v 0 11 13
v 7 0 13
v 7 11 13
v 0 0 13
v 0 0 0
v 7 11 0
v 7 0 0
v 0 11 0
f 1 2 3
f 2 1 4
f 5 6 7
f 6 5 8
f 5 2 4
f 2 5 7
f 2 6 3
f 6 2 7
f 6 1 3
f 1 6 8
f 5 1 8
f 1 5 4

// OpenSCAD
// Generated by SolidPython 1.0.1 on 2020-07-29 00:39:26


cube(size = [7, 11, 13]);
/***********************************************
*********      SolidPython code:      **********
************************************************
 
# import packages: SolidPython
from solid import *
from solid.utils import *
from itertools import chain, combinations


class Resize:

    def __init__(self, scad_file):
        self.scad_file = scad_file
        #self.scad_file = import_scad(scad_file)
        # cone/cylinder param:
        self.r1 = 0
        self.r2 = 0
        self.h = 0
        # rectangular prism param:
        self.w = 0
        self.l = 0
        # ellipse param:
        self.r = 0

    # import OpenScad code (file name corresponds to shape)


    # classify shape + parameters
    def assign(self, param1, param2, param3):
        if self.scad_file == 'cone.scad':
            self.r1 = param1
            self.r2 = param2
            self.h = param3
        elif self.scad_file == 'cylinder.scad':
            self.r1 = param1
            self.r2 = param2
            self.h = param3
        elif self.scad_file == 'rectangularPrism.scad':
            self.h = param1
            self.l = param2
            self.w = param3
        else:
            self.r = param1
            self.h = param2

    # resize parameters
    def iterate(self):
        x = range(3, 20, 2)
        i = 1
        if self.scad_file == 'cone.scad':
            tempList = list(combinations(x, 2))
            for temp in tempList:
                param1 = temp[0]
                param2 = temp[1]
                filepath = 'produced_scad_files/' + 'cone' + str(param1) + '_' + str(param2) + '_' + '.scad'
                scad_render_to_file(cylinder(h=param1, r1=param2, r2=0), filepath)

        elif self.scad_file == 'cylinder.scad':
            tempList = list(combinations(x, 3))
            for temp in tempList:
                param1 = temp[0]
                param2 = temp[1]
                filepath = 'produced_scad_files/' + 'cylinder' + str(param1) + '_' + str(param2) + '_' + '.scad'
                scad_render_to_file(cylinder(h=param1, r1=param2, r2=param2), filepath)

        elif self.scad_file == 'rectangularPrism.scad':
            tempList = list(combinations(x, 3))
            for temp in tempList:
                param1 = temp[0]
                param2 = temp[1]
                param3 = temp[2]
                filepath = 'produced_scad_files/' + 'rectangularPrism' + str(param1) + '_' + str(param2) + '_' + str(
                    param3) + '.scad'
                scad_render_to_file(cube(size=(param1, param2, param3)), filepath)

        elif self.scad_file == 'ellipse.scad':
            tempList = list(combinations(x, 4))
            for temp in tempList:
                param1 = temp[0]
                param2 = temp[1]
                param3 = temp[2]
                param4 = temp[3]
                filepath = 'produced_scad_files/' + 'ellipse' + str(param1) + '_' + str(param2) + '_' + str(param3) + '_' + str(param4) + '.scad'
                scad_render_to_file(scale([param1, param2, param3])(sphere(r=param4)), filepath)

    def render_to_scadfile(self):
        scad_render_to_file(scad, 'example.scad') 
 
************************************************/
